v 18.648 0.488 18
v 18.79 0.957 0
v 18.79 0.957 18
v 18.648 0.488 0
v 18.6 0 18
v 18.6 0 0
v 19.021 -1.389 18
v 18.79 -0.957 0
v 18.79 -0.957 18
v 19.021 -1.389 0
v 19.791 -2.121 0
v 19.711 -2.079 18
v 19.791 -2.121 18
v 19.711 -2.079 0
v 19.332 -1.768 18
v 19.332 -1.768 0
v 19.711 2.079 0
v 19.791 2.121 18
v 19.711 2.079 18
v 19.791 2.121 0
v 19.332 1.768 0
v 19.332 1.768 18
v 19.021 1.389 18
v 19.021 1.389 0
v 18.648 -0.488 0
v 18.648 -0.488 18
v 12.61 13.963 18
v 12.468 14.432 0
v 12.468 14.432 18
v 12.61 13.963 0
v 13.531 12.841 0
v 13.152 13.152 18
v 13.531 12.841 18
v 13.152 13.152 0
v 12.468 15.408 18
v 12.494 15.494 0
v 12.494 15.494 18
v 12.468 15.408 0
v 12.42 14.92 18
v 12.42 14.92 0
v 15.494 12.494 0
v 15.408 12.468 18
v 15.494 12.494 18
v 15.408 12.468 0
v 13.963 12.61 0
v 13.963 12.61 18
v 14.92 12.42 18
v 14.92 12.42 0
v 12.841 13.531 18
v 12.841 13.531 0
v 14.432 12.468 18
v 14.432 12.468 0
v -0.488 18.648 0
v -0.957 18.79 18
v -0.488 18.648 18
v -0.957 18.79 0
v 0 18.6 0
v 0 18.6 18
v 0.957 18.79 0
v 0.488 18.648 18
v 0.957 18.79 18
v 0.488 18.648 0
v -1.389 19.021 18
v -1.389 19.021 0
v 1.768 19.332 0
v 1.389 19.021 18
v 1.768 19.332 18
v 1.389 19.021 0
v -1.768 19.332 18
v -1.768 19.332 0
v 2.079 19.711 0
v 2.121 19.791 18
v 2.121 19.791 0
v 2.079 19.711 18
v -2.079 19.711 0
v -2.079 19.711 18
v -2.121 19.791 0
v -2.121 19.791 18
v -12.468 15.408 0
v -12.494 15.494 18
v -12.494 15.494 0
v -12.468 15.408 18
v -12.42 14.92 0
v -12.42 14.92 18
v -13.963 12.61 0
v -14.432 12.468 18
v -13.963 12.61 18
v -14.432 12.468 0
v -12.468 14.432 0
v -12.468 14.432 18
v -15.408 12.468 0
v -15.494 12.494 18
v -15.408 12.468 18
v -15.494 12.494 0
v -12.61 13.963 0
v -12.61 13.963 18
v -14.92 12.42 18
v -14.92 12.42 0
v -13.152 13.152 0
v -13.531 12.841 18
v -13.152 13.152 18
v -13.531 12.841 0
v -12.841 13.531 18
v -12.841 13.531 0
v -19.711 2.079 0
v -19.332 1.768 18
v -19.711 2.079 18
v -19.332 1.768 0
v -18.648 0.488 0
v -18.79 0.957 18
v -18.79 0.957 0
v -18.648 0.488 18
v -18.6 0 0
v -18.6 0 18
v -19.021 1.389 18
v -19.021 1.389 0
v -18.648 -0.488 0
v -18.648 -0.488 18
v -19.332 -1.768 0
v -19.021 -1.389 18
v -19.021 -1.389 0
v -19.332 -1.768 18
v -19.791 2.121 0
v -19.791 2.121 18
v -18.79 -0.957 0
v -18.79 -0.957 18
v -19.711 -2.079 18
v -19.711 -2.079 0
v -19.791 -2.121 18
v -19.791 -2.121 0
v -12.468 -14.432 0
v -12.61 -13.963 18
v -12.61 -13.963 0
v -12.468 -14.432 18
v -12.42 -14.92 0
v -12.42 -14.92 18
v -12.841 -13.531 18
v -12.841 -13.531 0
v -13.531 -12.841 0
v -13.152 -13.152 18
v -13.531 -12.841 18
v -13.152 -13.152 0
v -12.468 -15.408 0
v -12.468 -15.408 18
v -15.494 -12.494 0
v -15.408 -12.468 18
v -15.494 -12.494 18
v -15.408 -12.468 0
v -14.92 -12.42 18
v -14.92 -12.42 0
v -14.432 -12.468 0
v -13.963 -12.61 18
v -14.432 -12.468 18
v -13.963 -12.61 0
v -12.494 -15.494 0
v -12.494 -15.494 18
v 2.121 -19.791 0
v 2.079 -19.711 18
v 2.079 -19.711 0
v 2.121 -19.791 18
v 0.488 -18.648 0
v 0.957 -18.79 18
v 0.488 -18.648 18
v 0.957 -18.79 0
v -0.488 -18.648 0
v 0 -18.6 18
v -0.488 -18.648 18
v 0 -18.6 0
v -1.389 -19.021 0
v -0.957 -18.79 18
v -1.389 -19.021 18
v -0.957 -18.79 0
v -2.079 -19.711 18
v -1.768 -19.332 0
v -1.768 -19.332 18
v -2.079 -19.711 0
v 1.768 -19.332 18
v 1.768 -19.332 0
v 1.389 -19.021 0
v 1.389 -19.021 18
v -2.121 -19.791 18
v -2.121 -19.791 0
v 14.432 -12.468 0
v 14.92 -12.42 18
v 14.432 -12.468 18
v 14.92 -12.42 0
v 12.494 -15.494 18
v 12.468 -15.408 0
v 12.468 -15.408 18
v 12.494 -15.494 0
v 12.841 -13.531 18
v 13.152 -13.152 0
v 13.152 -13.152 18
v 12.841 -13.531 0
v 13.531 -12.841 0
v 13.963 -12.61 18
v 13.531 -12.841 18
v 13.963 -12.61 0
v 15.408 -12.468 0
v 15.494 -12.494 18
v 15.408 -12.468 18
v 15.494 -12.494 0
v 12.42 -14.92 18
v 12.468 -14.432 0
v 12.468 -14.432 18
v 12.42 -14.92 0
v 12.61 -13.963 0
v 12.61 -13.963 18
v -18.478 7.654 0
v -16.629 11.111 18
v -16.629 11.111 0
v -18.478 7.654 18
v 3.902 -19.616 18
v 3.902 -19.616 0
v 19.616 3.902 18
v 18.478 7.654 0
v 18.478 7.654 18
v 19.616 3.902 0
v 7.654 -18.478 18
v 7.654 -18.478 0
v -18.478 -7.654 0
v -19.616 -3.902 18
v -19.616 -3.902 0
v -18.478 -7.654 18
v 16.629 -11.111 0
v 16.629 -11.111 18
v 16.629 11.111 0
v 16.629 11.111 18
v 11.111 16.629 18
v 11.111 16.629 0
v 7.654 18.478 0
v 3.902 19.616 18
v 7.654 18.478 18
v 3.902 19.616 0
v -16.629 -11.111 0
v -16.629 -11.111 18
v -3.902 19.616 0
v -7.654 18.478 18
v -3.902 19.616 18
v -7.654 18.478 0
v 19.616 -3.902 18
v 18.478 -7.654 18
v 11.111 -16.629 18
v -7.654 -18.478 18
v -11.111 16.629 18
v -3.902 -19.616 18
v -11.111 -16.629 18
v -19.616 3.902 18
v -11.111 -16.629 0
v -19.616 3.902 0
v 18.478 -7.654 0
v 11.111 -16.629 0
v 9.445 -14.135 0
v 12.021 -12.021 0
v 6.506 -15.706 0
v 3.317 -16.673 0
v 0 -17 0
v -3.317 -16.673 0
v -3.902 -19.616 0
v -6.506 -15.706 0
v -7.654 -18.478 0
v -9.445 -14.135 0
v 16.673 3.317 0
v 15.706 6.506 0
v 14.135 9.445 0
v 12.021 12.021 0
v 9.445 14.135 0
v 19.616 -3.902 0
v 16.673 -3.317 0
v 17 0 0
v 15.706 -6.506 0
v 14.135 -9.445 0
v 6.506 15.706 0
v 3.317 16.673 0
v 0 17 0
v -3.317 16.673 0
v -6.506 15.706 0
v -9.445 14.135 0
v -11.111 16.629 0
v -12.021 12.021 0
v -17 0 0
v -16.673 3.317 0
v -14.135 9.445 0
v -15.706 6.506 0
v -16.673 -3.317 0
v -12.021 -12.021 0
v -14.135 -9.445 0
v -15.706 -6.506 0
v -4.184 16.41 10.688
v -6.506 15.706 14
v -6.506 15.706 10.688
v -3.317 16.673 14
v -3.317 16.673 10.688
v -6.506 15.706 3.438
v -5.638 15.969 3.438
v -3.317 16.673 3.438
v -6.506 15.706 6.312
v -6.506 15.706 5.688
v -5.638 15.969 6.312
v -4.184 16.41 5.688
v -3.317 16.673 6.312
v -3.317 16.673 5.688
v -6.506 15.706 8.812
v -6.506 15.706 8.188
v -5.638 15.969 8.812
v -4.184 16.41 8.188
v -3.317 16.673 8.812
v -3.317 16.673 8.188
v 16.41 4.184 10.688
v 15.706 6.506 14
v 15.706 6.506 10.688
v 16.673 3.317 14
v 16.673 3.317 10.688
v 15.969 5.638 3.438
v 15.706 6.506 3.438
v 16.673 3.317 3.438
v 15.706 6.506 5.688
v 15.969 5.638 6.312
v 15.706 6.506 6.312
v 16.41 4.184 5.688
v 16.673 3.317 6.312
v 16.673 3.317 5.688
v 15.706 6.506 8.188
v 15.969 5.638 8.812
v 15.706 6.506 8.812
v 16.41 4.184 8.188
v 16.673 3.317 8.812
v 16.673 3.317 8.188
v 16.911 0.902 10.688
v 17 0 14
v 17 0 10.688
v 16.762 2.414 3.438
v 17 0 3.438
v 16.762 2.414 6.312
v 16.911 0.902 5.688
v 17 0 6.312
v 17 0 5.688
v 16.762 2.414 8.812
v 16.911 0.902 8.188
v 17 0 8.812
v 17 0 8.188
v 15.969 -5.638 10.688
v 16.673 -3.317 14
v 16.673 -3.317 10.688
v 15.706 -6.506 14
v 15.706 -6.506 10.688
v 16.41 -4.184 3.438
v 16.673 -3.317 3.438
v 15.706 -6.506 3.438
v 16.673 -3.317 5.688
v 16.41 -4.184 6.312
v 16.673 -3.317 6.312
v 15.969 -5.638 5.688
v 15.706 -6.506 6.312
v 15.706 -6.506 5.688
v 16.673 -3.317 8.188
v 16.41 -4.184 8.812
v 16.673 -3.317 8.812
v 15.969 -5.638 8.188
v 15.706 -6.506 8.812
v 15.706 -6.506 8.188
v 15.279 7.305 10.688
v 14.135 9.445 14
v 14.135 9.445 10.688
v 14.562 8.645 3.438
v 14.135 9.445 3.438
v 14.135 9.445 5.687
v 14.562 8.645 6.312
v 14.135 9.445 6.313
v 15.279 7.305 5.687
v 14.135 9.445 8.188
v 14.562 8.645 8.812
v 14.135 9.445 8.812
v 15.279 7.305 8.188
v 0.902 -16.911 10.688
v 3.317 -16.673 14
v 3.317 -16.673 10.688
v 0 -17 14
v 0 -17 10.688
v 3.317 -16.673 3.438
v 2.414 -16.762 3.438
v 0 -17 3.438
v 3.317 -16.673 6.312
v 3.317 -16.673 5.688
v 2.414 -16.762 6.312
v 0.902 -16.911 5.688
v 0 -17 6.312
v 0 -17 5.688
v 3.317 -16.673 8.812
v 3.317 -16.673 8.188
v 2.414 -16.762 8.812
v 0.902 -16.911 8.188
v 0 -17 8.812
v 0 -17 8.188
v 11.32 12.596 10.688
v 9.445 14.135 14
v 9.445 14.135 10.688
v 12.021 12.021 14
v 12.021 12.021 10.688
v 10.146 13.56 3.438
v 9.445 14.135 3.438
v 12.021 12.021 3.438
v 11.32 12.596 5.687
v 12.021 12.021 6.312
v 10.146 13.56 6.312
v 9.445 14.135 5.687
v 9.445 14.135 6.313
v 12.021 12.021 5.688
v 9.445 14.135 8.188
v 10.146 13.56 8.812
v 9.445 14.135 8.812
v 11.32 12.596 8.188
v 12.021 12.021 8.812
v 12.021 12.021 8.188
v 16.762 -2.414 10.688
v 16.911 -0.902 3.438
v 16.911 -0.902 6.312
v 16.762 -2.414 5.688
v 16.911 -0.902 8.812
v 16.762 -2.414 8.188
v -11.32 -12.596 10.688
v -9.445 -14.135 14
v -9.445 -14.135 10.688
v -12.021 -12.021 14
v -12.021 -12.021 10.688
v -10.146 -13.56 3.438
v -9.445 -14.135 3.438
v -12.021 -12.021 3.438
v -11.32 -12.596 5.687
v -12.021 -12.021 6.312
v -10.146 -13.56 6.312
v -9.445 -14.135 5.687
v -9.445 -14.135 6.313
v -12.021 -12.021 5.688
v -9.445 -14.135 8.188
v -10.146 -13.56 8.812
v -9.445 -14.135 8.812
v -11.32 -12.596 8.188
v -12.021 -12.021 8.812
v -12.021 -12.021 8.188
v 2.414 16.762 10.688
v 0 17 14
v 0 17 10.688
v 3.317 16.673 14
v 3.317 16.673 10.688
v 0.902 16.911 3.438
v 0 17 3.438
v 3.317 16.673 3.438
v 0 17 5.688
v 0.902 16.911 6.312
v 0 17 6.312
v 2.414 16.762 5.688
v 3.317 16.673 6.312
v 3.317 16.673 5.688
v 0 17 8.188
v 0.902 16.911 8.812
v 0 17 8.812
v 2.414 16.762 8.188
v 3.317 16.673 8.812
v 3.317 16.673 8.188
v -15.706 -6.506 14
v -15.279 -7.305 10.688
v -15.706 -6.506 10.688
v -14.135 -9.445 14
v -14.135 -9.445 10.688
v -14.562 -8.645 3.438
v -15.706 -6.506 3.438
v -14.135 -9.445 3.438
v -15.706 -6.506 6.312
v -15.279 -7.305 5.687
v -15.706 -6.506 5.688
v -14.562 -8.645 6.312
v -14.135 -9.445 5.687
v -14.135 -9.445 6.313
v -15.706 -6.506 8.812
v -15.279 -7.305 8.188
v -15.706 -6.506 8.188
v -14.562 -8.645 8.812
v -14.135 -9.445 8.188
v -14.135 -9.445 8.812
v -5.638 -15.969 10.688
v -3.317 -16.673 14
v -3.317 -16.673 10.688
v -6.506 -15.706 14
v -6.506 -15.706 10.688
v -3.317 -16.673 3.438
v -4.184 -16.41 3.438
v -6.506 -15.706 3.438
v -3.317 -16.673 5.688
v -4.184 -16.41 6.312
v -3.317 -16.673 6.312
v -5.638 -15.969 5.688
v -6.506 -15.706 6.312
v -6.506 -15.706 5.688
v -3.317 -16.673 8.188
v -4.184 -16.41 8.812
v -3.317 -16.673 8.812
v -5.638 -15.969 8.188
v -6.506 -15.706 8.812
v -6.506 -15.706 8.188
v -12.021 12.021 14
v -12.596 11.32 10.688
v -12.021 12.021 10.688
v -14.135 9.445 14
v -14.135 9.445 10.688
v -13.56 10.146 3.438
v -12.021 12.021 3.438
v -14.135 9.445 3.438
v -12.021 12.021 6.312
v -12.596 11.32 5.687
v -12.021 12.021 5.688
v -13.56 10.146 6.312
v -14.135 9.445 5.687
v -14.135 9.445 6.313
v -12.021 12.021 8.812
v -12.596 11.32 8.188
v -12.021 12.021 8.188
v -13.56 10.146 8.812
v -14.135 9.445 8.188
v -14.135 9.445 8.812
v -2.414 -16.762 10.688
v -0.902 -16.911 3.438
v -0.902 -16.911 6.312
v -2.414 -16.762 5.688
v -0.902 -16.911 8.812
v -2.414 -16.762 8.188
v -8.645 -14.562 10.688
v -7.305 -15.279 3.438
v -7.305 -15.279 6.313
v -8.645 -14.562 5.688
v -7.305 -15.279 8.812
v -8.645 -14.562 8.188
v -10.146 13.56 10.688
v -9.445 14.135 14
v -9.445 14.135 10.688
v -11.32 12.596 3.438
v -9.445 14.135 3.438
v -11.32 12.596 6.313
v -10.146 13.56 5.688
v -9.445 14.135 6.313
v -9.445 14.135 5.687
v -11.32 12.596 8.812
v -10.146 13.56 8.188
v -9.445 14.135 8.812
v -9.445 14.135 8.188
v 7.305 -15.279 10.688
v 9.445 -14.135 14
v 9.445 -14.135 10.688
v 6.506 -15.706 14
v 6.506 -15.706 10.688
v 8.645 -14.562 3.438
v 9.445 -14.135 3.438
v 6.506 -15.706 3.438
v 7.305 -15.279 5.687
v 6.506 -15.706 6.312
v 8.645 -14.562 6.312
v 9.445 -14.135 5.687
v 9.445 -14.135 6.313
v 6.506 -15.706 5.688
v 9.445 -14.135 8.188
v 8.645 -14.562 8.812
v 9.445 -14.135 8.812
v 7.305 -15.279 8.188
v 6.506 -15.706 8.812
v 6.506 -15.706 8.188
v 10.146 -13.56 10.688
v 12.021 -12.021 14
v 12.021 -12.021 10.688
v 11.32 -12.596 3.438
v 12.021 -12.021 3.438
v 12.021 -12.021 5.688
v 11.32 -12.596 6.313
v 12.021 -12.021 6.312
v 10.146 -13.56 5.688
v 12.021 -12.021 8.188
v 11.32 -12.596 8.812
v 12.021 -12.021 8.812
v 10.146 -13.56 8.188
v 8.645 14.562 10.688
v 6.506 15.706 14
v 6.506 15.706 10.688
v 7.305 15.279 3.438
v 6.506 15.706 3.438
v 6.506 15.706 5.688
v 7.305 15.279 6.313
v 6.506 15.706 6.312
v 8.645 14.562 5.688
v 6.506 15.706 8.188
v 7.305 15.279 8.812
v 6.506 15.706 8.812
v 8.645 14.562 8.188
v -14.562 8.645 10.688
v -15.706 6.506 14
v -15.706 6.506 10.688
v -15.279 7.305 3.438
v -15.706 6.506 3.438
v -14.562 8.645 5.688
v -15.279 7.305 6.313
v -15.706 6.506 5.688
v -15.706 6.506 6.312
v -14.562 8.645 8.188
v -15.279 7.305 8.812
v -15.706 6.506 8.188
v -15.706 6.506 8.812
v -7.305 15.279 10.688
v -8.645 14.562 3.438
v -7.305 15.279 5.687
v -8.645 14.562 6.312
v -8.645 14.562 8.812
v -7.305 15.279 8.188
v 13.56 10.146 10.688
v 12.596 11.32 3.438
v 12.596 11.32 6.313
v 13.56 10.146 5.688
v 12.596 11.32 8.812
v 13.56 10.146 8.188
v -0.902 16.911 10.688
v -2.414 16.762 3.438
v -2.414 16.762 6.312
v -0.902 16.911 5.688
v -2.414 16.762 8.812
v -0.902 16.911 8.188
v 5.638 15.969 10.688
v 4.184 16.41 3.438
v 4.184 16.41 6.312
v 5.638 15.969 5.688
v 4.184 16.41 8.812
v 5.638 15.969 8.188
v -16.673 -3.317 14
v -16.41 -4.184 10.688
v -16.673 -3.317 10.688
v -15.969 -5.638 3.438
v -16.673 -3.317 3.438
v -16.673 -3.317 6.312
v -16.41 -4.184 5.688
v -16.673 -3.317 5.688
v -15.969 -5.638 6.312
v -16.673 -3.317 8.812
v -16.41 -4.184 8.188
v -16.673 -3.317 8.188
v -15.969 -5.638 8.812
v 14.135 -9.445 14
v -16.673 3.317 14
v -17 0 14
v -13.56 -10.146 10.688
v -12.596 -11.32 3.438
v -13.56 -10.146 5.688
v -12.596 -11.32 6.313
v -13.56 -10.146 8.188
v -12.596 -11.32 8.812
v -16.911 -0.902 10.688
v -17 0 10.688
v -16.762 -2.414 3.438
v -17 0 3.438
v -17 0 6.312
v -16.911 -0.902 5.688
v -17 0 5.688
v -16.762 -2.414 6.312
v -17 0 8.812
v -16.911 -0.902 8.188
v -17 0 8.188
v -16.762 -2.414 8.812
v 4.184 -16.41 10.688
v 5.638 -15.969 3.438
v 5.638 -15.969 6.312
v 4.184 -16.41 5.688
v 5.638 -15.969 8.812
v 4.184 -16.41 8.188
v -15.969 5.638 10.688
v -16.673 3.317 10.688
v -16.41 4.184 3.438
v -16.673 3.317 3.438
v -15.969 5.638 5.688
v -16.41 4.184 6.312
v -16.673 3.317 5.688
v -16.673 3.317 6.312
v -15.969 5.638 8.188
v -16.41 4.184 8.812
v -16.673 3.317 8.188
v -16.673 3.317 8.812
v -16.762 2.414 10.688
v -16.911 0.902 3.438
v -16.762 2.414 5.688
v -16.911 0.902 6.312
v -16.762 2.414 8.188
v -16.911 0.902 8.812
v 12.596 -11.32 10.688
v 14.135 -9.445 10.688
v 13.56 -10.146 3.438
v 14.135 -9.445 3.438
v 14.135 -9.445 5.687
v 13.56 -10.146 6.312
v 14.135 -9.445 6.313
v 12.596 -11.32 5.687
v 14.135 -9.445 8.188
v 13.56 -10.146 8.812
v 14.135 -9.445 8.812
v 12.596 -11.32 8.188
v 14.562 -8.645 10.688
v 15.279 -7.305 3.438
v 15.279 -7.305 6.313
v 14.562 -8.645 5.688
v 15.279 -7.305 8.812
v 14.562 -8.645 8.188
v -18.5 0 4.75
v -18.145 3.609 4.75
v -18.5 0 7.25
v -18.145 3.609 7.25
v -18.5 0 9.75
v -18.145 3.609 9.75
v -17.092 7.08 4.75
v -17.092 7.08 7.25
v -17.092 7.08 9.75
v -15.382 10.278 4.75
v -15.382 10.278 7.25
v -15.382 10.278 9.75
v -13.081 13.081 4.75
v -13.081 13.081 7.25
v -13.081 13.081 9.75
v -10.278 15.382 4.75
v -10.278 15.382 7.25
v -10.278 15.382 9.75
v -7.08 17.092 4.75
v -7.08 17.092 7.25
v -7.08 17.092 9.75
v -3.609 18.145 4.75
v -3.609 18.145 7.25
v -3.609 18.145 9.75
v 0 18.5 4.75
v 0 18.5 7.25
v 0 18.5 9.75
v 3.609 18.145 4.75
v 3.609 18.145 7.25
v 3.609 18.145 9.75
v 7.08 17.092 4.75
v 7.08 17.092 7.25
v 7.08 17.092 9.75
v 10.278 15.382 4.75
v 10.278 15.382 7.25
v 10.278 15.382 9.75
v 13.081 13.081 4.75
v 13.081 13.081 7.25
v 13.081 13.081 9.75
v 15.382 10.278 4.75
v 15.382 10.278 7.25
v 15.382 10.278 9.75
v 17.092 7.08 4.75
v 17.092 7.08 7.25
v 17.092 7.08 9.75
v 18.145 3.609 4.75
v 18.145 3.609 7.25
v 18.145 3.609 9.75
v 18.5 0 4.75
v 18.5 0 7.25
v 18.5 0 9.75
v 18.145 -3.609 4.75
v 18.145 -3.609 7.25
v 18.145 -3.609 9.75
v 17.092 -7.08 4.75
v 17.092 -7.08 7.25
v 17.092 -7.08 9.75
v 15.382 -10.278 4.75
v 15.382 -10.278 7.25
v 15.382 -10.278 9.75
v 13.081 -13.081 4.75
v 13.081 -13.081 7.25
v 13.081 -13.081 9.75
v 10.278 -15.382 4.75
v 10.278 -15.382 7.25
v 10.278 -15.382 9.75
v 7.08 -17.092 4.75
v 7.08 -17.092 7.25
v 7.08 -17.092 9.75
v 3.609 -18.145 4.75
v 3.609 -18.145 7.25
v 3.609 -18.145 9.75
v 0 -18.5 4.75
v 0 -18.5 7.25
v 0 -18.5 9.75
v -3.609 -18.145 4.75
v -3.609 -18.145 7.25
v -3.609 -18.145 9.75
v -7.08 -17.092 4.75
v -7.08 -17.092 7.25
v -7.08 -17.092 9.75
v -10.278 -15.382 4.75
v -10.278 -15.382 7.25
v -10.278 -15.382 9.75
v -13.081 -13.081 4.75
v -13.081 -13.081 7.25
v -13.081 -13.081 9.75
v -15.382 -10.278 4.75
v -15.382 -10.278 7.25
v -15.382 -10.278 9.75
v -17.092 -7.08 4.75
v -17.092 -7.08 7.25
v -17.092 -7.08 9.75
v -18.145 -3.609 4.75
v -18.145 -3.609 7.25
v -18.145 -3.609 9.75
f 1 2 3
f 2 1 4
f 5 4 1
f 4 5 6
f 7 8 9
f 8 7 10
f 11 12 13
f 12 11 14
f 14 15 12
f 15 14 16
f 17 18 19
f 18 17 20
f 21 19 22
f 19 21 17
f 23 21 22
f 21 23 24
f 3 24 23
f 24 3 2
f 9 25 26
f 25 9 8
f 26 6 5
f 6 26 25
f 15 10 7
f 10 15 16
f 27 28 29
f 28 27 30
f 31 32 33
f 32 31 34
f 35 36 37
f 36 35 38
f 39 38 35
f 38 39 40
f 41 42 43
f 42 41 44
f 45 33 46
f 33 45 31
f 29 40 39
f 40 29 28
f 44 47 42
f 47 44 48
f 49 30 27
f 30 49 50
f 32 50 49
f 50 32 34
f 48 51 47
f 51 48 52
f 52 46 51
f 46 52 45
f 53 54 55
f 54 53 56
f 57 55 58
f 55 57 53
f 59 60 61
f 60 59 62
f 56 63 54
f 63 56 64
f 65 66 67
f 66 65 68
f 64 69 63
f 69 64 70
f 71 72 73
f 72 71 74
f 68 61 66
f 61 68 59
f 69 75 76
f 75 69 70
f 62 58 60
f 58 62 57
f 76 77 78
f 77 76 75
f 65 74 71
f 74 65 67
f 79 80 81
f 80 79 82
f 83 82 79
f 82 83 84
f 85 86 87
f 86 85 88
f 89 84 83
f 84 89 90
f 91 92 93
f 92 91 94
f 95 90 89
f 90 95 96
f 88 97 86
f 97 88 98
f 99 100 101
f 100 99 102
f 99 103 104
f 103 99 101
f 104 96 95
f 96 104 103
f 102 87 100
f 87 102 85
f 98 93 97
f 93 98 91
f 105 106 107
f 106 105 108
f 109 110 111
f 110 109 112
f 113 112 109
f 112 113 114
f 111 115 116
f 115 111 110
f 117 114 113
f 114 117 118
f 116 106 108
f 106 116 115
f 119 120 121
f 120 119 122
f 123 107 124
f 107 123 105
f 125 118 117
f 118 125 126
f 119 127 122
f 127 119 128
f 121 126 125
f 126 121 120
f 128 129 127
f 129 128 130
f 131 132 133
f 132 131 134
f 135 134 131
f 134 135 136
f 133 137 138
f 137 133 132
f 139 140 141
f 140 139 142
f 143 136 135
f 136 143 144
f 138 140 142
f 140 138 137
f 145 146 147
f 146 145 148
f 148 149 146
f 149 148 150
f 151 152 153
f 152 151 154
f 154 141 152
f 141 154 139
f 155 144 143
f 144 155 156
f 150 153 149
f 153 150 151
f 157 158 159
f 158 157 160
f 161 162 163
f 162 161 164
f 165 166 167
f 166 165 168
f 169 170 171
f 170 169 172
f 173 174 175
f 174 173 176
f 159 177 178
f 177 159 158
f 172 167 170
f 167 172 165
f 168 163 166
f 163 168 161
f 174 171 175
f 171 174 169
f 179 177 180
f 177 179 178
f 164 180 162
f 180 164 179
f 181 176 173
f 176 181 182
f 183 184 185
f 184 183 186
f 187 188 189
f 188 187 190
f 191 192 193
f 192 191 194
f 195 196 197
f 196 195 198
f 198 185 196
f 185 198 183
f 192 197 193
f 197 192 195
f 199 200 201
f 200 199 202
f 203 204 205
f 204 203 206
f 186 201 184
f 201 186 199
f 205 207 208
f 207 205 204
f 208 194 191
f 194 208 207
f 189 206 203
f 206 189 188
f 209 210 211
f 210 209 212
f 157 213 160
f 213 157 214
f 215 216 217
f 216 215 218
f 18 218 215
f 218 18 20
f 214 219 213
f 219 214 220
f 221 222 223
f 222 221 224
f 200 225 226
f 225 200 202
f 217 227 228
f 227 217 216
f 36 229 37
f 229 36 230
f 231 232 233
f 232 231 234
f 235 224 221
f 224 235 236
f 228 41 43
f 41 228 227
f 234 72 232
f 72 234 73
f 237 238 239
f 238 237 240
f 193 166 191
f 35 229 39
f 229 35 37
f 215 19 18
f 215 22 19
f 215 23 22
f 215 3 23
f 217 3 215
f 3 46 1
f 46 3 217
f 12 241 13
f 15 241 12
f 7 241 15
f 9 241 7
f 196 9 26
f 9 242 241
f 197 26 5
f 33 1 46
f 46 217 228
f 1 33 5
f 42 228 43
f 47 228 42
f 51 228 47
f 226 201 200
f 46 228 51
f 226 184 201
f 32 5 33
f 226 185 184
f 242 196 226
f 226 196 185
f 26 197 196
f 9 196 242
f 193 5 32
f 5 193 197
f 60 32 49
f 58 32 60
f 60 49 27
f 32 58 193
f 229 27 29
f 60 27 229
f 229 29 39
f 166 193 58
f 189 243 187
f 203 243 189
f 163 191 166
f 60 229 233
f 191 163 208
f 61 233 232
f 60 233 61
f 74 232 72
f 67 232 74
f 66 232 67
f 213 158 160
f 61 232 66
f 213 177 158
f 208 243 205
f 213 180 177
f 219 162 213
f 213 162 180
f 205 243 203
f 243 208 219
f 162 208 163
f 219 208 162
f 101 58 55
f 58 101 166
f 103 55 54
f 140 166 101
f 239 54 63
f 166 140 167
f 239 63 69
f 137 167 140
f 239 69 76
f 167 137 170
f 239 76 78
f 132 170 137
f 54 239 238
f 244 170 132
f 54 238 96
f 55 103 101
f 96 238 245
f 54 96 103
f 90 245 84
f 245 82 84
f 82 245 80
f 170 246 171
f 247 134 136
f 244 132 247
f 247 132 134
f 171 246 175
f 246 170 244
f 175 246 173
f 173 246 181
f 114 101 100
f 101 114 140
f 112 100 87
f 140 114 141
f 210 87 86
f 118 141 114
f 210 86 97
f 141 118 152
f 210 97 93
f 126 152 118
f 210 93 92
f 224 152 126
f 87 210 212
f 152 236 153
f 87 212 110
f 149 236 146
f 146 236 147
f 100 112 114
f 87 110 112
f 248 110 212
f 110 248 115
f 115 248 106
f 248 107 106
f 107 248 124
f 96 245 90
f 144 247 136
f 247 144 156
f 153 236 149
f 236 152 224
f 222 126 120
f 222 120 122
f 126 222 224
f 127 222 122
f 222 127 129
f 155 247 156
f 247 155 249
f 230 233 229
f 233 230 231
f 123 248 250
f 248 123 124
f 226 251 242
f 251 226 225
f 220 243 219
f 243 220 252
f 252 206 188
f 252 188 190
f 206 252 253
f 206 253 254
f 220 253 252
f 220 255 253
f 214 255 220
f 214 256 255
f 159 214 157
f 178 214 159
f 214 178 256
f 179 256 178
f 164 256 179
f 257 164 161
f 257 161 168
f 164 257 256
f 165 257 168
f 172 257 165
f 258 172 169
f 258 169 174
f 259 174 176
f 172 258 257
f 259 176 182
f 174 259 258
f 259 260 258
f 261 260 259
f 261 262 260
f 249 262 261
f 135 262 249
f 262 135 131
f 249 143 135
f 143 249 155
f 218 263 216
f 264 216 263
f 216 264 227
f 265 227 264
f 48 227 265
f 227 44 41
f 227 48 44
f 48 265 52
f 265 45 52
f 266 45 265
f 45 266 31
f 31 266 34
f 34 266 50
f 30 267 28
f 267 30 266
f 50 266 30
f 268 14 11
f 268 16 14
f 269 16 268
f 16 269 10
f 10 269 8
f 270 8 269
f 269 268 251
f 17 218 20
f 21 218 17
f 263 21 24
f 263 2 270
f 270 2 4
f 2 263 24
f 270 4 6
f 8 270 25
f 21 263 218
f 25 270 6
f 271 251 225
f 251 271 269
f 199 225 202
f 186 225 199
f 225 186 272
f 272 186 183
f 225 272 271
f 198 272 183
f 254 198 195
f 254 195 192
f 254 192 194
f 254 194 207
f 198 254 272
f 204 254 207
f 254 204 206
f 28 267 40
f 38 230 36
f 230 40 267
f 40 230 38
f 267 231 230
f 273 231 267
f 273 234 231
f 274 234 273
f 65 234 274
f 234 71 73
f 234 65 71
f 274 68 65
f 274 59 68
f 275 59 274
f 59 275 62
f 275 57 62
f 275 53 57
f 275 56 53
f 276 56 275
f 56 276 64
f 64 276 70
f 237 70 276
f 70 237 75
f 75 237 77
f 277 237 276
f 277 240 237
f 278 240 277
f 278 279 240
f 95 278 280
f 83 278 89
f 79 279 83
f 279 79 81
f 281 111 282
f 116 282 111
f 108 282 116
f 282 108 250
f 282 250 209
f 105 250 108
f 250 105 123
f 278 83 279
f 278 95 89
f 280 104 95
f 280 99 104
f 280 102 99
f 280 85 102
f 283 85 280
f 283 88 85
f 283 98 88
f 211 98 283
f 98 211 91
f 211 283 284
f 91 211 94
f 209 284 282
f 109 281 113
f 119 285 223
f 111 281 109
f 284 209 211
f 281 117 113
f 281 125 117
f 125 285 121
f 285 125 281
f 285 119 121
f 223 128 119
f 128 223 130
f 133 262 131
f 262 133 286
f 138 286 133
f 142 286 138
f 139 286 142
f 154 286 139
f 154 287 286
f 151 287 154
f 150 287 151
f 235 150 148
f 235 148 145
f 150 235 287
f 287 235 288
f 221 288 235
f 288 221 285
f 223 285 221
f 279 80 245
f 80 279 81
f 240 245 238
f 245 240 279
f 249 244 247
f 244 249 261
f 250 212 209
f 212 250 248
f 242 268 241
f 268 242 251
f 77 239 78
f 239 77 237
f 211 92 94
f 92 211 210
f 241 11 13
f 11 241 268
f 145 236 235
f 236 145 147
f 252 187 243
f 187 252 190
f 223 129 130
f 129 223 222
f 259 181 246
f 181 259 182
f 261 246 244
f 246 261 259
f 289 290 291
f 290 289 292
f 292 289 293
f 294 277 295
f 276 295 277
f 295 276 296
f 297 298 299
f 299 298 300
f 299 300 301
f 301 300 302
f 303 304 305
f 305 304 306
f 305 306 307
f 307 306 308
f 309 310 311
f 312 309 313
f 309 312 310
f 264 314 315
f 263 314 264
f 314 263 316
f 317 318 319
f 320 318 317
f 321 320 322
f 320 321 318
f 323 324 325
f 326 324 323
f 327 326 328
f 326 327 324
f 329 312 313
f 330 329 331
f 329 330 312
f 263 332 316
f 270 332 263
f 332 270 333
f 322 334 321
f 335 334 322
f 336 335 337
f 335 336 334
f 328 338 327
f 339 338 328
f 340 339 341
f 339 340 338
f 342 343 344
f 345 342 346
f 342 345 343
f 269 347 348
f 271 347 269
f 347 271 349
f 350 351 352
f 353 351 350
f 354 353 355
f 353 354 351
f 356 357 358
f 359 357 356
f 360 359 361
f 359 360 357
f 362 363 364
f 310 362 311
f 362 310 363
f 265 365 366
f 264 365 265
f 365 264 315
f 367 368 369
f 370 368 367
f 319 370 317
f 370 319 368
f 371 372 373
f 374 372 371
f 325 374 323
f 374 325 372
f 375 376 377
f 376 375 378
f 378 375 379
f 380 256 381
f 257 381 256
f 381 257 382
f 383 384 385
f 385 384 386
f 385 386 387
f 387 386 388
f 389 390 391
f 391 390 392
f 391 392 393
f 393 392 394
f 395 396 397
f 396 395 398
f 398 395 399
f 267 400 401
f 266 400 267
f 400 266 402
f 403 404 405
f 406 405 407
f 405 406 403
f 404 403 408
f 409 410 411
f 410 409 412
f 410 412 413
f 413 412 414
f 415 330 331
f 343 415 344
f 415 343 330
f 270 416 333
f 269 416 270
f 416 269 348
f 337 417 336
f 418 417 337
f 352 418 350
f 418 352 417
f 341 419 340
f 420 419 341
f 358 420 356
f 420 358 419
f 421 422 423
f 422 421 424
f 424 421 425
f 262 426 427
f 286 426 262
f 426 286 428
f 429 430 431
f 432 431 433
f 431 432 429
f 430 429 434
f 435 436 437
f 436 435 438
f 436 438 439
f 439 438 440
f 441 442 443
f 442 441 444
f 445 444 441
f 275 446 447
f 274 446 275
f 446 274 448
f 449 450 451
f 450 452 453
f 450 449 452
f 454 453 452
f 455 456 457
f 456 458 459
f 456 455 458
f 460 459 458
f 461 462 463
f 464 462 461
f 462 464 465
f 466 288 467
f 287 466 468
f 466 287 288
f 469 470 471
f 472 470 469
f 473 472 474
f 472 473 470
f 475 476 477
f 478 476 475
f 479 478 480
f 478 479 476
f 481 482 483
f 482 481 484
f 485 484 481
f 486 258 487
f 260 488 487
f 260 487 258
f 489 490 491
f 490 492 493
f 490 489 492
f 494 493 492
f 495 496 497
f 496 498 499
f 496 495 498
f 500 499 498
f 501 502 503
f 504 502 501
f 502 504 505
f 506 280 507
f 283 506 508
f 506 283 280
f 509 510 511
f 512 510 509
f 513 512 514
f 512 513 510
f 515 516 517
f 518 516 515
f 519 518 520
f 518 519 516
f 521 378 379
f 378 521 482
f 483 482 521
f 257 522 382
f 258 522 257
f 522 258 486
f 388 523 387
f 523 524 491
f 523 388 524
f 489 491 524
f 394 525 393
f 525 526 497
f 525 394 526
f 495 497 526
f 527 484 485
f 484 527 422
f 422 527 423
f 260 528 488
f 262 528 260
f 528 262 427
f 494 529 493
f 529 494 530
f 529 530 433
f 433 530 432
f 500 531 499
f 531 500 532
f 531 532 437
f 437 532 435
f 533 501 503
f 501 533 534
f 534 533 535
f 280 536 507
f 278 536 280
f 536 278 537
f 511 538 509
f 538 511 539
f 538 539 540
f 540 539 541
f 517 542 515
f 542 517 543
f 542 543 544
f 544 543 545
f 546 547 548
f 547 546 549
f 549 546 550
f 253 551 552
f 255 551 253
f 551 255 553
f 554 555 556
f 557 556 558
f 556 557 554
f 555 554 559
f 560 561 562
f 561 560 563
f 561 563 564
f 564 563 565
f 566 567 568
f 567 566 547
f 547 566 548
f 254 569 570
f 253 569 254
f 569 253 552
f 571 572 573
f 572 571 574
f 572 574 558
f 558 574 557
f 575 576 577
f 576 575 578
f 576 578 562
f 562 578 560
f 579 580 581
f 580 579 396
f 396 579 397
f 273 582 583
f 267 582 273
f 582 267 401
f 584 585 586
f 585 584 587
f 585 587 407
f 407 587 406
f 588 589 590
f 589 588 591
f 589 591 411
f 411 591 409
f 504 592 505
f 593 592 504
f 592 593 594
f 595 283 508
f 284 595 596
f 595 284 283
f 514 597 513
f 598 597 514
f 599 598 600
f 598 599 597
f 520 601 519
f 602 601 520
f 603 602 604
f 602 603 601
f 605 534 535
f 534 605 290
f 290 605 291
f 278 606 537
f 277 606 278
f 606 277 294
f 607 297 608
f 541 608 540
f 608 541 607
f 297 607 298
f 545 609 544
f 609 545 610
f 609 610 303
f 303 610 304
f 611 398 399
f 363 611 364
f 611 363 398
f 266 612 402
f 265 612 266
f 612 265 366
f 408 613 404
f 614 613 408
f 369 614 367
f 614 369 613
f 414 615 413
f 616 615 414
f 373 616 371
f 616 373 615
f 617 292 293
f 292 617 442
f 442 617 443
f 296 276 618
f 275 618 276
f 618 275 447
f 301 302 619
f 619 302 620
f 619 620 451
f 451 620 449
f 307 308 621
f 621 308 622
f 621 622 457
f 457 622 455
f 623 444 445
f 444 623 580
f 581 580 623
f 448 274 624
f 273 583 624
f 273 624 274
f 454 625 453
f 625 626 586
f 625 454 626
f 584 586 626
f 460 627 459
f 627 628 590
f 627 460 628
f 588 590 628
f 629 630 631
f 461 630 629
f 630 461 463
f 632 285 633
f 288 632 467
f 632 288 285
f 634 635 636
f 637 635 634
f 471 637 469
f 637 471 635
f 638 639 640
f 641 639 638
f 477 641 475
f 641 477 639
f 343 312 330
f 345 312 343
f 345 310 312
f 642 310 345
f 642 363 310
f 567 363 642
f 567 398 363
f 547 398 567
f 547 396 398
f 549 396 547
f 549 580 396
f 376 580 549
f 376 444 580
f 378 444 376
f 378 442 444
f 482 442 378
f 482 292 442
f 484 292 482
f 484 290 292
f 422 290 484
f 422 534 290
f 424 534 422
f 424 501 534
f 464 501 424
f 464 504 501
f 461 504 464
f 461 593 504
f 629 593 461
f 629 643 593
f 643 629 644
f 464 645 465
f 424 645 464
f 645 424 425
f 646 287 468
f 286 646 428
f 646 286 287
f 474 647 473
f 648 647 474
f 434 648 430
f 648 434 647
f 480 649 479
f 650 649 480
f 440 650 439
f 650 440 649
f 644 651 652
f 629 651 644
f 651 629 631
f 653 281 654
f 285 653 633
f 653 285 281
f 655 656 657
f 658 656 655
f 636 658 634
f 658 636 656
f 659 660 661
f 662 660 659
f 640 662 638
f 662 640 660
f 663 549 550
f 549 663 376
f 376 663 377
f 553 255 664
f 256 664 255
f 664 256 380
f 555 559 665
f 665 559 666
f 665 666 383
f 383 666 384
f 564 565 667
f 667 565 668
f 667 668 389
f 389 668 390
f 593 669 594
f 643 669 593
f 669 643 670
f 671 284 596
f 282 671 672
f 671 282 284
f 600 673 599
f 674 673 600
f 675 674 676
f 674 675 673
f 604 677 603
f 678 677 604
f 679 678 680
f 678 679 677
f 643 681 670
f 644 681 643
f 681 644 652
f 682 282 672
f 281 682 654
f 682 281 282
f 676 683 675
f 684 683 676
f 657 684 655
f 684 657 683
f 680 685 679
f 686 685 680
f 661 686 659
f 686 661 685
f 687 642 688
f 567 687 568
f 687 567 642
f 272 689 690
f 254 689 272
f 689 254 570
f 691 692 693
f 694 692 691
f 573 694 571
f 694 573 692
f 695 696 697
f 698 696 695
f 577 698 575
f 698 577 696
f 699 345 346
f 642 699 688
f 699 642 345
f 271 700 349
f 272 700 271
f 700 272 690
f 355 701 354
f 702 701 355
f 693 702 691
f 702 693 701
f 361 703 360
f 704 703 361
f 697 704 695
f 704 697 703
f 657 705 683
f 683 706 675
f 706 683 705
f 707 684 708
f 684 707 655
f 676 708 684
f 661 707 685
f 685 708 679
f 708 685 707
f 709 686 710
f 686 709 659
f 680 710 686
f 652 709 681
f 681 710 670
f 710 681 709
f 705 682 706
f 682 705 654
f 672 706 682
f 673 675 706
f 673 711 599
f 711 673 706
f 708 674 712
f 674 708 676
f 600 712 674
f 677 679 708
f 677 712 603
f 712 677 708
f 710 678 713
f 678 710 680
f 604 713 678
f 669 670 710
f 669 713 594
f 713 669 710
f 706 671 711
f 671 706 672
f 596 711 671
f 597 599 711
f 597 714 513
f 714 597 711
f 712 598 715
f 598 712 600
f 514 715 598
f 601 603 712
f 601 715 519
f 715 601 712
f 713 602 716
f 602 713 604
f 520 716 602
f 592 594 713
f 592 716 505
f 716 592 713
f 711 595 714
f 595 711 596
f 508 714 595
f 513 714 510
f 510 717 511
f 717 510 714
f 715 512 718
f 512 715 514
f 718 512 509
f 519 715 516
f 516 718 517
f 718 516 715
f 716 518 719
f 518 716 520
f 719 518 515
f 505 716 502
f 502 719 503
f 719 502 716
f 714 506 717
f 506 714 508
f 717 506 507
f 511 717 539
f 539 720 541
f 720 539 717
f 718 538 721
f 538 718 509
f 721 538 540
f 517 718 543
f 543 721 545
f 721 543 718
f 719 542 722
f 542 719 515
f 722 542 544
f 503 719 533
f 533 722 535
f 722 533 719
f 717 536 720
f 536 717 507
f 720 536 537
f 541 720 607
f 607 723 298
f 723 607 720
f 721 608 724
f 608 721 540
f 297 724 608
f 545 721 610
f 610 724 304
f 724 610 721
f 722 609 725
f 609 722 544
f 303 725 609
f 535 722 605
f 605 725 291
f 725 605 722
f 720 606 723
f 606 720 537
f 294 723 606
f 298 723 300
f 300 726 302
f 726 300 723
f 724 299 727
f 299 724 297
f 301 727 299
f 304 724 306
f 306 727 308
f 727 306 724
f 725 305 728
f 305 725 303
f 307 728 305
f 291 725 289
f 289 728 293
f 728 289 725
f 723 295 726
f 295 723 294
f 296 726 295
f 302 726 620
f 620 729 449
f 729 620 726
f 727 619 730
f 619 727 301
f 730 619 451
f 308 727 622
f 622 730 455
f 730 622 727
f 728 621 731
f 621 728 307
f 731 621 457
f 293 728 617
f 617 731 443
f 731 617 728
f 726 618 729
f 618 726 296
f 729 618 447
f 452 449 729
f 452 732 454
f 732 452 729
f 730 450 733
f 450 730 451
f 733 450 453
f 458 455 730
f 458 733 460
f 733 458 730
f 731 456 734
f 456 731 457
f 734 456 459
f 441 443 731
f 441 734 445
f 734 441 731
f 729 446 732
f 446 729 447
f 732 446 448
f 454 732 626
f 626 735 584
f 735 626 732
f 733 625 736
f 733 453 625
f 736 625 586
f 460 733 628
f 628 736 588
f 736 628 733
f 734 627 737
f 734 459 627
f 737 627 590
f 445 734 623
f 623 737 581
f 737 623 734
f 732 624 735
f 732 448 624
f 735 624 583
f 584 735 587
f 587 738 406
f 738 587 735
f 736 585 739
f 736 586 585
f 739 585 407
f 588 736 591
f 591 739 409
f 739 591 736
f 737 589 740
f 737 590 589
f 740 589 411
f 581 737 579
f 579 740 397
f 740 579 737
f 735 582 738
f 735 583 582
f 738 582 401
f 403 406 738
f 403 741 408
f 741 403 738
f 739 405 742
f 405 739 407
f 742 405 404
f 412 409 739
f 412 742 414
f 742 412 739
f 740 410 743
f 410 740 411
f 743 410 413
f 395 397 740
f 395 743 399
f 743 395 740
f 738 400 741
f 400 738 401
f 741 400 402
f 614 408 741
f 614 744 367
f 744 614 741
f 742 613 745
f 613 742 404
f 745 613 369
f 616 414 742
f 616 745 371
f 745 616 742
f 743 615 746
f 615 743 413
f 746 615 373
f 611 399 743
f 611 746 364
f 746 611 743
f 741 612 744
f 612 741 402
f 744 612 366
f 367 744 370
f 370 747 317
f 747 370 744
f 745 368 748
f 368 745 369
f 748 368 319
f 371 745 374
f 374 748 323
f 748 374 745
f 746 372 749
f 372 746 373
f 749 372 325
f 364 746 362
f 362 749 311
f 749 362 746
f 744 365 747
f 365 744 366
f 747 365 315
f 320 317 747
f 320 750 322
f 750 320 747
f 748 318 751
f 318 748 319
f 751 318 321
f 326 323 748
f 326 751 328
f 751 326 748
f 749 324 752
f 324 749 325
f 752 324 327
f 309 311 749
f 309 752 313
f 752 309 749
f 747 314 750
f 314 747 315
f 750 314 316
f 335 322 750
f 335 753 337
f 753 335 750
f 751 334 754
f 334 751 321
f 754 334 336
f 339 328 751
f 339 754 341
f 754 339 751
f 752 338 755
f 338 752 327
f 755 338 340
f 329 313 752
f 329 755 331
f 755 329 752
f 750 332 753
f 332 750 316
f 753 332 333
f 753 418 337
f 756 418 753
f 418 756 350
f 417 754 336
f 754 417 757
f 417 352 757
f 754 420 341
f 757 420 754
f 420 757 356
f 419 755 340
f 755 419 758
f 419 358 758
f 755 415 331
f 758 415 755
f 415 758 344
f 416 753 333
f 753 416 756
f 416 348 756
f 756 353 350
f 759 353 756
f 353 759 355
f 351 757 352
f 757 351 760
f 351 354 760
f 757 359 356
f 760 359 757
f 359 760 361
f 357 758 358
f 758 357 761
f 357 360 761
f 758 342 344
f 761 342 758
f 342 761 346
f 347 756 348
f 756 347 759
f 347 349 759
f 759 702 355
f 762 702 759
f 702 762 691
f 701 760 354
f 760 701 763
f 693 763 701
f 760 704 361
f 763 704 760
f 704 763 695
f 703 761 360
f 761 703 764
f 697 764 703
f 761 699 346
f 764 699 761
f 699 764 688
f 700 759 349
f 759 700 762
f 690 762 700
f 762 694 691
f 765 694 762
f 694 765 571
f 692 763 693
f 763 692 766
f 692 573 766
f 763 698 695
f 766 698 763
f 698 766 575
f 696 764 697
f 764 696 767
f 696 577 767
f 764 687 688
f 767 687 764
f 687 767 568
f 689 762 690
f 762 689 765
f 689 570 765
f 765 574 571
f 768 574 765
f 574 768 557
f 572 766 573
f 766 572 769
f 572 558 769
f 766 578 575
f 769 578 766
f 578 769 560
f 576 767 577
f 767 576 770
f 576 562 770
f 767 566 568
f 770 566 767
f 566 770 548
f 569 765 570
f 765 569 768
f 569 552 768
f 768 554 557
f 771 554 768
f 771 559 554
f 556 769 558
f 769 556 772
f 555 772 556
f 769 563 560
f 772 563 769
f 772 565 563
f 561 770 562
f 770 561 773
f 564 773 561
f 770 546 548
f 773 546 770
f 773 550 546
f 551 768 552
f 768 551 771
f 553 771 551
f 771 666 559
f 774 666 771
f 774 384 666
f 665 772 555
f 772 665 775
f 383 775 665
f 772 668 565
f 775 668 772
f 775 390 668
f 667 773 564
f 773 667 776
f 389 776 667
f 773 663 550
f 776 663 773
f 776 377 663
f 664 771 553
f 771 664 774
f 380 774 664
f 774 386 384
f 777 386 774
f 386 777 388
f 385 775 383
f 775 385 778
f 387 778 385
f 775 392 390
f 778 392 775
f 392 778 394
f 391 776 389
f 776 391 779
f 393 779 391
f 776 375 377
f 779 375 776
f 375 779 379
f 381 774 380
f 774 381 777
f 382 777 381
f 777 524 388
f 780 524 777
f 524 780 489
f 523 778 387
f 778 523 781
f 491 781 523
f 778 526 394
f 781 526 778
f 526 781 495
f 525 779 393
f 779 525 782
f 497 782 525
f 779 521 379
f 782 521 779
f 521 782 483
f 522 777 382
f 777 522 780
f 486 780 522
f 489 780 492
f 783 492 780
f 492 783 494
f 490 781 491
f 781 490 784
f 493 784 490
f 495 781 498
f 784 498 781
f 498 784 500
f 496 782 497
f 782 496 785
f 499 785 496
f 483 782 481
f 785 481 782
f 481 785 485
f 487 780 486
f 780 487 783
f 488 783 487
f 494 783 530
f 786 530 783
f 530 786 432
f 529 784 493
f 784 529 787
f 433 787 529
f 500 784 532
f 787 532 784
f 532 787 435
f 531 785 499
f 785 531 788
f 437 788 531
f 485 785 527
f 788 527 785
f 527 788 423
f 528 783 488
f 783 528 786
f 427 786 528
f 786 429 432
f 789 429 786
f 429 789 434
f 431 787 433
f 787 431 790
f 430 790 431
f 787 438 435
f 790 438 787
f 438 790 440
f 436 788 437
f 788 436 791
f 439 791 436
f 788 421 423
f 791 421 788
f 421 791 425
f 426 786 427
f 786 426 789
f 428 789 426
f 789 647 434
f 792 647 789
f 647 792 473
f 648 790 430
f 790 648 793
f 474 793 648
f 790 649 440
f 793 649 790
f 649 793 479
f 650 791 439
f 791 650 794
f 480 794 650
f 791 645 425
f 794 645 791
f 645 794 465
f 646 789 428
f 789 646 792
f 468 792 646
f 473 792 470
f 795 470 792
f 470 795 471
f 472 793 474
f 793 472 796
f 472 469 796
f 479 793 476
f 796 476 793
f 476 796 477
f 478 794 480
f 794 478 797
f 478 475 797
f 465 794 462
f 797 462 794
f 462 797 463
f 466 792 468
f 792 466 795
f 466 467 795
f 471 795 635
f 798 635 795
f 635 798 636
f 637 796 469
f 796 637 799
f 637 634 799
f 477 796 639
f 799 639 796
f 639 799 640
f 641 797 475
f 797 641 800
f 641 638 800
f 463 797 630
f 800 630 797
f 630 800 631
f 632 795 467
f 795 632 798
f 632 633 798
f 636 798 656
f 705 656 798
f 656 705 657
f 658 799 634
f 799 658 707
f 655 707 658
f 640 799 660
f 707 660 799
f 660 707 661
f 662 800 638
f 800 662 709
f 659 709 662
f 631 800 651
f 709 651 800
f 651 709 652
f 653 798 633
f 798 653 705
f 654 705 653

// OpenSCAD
$fn = 32;

// ----------------------------------------------------------------------
// Threaded cap: 40 mm body, 18 mm tall, 34 mm threaded bore
// ----------------------------------------------------------------------

// --- parameters (mm) ---
outer_d = 40;             // cap outside diameter
body_h = 18;              // cap height
top_t = 4;                // closed top thickness
bore_d = 34;              // bore core diameter
pitch = 2.5;              // thread pitch
thread_d = 1.5;           // thread depth
thread_z = 3;             // thread start above the rim
thread_h = 8;             // threaded height
flutes = 8;               // number of knurl flutes
flute_d = 5;              // flute cutter diameter
flute_depth = 1.4;        // flute depth into the rim

difference() {
  union() {
    cylinder(h = 18, d = outer_d);
  }
  /* threaded bore, closed at the top */
  translate([0, 0, -2.5]) cylinder(h = 16.5, d = bore_d);
  translate([0, 0, 3]) rotate_extrude() polygon([[16, 0], [16, 8], [16.5, 8], [18.5, 6.75], [16.5, 5.5], [18.5, 4.25], [16.5, 3], [18.5, 1.75], [16.5, 0], [16, 0]]);
  /* knurl flutes around the rim */
  for (i = [0 : flutes - 1]) {
    a = i * 360 / flutes;
    translate([(outer_d / 2 + flute_d / 2 - flute_depth) * cos(a), (outer_d / 2 + flute_d / 2 - flute_depth) * sin(a), -2.5]) cylinder(h = body_h + 5, d = flute_d);
  }
}
